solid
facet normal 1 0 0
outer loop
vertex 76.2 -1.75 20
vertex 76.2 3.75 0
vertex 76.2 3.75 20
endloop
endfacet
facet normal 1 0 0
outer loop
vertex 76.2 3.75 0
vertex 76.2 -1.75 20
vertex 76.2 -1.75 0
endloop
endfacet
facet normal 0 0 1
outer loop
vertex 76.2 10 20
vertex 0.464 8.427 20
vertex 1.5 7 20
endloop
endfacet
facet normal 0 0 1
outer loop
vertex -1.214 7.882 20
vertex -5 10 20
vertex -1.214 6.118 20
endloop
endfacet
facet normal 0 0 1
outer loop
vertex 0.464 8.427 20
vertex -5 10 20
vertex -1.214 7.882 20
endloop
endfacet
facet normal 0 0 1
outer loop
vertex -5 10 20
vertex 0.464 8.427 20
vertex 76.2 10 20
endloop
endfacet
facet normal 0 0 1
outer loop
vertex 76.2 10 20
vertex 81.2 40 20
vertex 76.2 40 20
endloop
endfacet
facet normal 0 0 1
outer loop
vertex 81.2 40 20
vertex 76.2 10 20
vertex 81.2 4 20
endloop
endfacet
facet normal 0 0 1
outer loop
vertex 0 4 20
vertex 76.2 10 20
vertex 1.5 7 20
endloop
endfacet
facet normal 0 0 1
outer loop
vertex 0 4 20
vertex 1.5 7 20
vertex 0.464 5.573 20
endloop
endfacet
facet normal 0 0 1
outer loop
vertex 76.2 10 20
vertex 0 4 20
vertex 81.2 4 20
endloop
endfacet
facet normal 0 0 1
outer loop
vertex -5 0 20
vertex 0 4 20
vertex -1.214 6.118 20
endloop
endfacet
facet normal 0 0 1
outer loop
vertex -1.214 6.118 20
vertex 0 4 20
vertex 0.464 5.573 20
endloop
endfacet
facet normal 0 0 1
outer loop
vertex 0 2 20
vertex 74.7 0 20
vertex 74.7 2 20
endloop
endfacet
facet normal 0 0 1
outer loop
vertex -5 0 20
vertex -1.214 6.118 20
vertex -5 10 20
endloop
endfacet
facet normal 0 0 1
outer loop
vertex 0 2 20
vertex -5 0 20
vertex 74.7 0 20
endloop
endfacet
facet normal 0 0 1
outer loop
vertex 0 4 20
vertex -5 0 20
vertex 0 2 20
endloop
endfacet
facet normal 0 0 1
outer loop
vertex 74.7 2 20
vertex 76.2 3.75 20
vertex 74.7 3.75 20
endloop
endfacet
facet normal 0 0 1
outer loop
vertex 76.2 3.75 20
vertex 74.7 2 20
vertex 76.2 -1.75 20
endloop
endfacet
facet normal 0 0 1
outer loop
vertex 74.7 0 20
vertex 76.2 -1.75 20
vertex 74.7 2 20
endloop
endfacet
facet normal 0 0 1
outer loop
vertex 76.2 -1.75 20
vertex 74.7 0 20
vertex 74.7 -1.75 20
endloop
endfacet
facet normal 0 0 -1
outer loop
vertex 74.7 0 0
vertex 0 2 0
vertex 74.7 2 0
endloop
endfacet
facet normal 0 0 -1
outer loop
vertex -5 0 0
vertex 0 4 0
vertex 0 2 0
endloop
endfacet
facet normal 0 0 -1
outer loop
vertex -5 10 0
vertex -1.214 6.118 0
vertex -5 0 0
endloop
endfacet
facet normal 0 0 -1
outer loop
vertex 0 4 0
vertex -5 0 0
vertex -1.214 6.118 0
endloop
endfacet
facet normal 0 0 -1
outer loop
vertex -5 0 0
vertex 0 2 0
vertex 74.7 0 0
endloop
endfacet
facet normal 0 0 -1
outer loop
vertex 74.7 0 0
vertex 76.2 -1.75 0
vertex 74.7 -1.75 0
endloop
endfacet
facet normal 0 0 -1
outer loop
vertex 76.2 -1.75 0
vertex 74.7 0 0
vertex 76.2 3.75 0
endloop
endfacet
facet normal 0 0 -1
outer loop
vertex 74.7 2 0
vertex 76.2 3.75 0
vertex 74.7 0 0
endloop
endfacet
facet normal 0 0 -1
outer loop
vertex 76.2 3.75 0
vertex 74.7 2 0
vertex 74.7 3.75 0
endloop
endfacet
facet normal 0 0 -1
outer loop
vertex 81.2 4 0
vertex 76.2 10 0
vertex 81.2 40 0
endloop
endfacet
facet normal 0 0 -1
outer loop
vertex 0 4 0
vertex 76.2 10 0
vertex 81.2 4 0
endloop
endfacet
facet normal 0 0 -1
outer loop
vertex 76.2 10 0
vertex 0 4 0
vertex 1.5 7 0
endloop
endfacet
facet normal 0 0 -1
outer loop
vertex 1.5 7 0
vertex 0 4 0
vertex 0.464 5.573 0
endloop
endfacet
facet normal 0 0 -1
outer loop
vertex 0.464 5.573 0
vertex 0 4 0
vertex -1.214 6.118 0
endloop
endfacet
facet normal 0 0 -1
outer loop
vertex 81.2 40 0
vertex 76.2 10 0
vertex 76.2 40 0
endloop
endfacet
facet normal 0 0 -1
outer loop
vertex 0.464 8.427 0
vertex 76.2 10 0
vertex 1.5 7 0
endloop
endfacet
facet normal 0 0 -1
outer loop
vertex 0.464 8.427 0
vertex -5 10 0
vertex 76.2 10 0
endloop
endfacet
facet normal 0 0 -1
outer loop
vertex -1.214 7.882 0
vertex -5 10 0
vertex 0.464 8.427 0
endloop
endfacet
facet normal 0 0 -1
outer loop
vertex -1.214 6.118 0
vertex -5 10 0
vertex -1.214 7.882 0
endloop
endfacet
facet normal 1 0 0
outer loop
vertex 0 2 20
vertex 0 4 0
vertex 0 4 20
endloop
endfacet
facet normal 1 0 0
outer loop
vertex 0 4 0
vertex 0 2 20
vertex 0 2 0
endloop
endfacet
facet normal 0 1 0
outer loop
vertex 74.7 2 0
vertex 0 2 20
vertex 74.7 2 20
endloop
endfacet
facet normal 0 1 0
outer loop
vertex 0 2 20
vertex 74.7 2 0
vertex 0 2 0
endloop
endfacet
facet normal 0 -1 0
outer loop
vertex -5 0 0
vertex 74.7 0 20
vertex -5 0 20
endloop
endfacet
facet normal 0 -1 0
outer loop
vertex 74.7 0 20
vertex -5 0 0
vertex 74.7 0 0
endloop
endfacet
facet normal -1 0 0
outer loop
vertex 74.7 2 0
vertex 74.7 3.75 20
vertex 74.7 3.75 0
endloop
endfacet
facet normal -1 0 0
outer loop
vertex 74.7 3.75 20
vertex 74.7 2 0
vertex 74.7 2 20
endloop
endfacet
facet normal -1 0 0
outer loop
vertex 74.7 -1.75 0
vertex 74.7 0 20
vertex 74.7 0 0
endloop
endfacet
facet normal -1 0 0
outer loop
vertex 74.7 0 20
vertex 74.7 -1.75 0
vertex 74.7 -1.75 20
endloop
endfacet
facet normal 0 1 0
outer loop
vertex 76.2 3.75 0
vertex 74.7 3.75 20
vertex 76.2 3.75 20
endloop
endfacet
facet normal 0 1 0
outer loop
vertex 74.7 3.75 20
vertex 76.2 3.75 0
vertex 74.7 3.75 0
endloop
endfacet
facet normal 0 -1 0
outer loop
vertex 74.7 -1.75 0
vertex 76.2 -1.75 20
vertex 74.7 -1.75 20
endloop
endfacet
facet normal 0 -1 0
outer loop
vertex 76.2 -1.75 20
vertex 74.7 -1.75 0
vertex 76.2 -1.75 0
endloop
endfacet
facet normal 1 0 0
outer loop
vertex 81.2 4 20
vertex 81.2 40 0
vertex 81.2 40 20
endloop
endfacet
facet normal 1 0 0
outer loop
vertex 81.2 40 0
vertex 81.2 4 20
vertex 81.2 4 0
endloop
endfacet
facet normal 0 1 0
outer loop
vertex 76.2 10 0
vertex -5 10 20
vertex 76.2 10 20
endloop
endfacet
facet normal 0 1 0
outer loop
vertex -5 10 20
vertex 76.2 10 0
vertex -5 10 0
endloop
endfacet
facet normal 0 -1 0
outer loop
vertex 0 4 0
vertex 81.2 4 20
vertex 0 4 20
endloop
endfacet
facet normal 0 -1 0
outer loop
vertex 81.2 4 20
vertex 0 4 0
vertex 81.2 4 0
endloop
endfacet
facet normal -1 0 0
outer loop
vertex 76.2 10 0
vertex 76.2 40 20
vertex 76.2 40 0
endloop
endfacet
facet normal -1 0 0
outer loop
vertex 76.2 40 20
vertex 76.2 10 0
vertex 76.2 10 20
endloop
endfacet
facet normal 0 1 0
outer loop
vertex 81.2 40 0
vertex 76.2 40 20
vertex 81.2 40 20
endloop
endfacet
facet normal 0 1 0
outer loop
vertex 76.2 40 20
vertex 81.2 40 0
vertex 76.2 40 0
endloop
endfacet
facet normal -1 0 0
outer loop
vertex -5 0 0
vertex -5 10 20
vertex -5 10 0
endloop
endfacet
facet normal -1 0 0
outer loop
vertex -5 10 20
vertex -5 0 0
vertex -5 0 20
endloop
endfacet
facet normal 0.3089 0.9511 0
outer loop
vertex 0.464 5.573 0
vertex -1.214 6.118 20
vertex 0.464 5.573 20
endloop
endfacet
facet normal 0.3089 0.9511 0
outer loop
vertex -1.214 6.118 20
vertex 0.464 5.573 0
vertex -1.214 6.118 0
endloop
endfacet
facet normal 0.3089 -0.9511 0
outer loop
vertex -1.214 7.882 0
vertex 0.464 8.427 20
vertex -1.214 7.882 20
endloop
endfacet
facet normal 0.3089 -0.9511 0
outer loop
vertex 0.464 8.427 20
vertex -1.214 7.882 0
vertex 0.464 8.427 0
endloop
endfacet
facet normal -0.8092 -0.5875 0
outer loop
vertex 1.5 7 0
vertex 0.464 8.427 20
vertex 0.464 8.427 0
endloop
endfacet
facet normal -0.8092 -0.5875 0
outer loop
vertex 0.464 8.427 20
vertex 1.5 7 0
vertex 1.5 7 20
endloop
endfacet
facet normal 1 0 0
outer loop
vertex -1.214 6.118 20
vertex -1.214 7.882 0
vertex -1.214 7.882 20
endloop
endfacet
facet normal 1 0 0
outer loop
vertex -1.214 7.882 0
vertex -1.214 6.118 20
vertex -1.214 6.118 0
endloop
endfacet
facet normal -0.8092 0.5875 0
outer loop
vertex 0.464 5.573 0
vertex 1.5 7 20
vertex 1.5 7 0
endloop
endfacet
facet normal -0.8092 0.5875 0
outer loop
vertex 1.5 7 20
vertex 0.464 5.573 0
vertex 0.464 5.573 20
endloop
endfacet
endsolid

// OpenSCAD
//webbing size
ws=25.4;

width=20;

hook_length=3*ws;
hook_thickness=2;
hook_retention=1.75;
hook_retention_h=1.5;

top_length=5;

gap=2;
v_thickness=6;
h_thickness=5;

carrier_length=3*ws+5;
shelf_depth=30;

hole_d=3;

module hole(){
  hole_y_offset=hook_thickness+gap+0.5*v_thickness;
  translate([0, hole_y_offset, 0])
    cylinder(h=width, r=hole_d/2, center=false);
}
module hook() {
  cube([hook_length, hook_thickness, width]);
  
  retention_y=2*hook_retention+hook_thickness;
  translate([hook_length-hook_retention_h, -hook_retention, 0]) 
    cube([hook_retention_h, retention_y, width]);
}

module carrier() {
  cube([carrier_length, v_thickness, width ]);
  translate([carrier_length-h_thickness, v_thickness, 0])
    cube([h_thickness, shelf_depth, width ]);  
}

module top_joint() {
  joint_depth=hook_thickness+gap+v_thickness;
  cube([h_thickness, joint_depth ,width]);
}

carrier_y_offset=hook_thickness + gap;
joint_x_offset=h_thickness+carrier_length;

difference(){
  union(){
    hook();
    translate([0, carrier_y_offset, 0]) carrier();
    translate([-h_thickness, 0, 0]) top_joint();
  }
  hole();
}
